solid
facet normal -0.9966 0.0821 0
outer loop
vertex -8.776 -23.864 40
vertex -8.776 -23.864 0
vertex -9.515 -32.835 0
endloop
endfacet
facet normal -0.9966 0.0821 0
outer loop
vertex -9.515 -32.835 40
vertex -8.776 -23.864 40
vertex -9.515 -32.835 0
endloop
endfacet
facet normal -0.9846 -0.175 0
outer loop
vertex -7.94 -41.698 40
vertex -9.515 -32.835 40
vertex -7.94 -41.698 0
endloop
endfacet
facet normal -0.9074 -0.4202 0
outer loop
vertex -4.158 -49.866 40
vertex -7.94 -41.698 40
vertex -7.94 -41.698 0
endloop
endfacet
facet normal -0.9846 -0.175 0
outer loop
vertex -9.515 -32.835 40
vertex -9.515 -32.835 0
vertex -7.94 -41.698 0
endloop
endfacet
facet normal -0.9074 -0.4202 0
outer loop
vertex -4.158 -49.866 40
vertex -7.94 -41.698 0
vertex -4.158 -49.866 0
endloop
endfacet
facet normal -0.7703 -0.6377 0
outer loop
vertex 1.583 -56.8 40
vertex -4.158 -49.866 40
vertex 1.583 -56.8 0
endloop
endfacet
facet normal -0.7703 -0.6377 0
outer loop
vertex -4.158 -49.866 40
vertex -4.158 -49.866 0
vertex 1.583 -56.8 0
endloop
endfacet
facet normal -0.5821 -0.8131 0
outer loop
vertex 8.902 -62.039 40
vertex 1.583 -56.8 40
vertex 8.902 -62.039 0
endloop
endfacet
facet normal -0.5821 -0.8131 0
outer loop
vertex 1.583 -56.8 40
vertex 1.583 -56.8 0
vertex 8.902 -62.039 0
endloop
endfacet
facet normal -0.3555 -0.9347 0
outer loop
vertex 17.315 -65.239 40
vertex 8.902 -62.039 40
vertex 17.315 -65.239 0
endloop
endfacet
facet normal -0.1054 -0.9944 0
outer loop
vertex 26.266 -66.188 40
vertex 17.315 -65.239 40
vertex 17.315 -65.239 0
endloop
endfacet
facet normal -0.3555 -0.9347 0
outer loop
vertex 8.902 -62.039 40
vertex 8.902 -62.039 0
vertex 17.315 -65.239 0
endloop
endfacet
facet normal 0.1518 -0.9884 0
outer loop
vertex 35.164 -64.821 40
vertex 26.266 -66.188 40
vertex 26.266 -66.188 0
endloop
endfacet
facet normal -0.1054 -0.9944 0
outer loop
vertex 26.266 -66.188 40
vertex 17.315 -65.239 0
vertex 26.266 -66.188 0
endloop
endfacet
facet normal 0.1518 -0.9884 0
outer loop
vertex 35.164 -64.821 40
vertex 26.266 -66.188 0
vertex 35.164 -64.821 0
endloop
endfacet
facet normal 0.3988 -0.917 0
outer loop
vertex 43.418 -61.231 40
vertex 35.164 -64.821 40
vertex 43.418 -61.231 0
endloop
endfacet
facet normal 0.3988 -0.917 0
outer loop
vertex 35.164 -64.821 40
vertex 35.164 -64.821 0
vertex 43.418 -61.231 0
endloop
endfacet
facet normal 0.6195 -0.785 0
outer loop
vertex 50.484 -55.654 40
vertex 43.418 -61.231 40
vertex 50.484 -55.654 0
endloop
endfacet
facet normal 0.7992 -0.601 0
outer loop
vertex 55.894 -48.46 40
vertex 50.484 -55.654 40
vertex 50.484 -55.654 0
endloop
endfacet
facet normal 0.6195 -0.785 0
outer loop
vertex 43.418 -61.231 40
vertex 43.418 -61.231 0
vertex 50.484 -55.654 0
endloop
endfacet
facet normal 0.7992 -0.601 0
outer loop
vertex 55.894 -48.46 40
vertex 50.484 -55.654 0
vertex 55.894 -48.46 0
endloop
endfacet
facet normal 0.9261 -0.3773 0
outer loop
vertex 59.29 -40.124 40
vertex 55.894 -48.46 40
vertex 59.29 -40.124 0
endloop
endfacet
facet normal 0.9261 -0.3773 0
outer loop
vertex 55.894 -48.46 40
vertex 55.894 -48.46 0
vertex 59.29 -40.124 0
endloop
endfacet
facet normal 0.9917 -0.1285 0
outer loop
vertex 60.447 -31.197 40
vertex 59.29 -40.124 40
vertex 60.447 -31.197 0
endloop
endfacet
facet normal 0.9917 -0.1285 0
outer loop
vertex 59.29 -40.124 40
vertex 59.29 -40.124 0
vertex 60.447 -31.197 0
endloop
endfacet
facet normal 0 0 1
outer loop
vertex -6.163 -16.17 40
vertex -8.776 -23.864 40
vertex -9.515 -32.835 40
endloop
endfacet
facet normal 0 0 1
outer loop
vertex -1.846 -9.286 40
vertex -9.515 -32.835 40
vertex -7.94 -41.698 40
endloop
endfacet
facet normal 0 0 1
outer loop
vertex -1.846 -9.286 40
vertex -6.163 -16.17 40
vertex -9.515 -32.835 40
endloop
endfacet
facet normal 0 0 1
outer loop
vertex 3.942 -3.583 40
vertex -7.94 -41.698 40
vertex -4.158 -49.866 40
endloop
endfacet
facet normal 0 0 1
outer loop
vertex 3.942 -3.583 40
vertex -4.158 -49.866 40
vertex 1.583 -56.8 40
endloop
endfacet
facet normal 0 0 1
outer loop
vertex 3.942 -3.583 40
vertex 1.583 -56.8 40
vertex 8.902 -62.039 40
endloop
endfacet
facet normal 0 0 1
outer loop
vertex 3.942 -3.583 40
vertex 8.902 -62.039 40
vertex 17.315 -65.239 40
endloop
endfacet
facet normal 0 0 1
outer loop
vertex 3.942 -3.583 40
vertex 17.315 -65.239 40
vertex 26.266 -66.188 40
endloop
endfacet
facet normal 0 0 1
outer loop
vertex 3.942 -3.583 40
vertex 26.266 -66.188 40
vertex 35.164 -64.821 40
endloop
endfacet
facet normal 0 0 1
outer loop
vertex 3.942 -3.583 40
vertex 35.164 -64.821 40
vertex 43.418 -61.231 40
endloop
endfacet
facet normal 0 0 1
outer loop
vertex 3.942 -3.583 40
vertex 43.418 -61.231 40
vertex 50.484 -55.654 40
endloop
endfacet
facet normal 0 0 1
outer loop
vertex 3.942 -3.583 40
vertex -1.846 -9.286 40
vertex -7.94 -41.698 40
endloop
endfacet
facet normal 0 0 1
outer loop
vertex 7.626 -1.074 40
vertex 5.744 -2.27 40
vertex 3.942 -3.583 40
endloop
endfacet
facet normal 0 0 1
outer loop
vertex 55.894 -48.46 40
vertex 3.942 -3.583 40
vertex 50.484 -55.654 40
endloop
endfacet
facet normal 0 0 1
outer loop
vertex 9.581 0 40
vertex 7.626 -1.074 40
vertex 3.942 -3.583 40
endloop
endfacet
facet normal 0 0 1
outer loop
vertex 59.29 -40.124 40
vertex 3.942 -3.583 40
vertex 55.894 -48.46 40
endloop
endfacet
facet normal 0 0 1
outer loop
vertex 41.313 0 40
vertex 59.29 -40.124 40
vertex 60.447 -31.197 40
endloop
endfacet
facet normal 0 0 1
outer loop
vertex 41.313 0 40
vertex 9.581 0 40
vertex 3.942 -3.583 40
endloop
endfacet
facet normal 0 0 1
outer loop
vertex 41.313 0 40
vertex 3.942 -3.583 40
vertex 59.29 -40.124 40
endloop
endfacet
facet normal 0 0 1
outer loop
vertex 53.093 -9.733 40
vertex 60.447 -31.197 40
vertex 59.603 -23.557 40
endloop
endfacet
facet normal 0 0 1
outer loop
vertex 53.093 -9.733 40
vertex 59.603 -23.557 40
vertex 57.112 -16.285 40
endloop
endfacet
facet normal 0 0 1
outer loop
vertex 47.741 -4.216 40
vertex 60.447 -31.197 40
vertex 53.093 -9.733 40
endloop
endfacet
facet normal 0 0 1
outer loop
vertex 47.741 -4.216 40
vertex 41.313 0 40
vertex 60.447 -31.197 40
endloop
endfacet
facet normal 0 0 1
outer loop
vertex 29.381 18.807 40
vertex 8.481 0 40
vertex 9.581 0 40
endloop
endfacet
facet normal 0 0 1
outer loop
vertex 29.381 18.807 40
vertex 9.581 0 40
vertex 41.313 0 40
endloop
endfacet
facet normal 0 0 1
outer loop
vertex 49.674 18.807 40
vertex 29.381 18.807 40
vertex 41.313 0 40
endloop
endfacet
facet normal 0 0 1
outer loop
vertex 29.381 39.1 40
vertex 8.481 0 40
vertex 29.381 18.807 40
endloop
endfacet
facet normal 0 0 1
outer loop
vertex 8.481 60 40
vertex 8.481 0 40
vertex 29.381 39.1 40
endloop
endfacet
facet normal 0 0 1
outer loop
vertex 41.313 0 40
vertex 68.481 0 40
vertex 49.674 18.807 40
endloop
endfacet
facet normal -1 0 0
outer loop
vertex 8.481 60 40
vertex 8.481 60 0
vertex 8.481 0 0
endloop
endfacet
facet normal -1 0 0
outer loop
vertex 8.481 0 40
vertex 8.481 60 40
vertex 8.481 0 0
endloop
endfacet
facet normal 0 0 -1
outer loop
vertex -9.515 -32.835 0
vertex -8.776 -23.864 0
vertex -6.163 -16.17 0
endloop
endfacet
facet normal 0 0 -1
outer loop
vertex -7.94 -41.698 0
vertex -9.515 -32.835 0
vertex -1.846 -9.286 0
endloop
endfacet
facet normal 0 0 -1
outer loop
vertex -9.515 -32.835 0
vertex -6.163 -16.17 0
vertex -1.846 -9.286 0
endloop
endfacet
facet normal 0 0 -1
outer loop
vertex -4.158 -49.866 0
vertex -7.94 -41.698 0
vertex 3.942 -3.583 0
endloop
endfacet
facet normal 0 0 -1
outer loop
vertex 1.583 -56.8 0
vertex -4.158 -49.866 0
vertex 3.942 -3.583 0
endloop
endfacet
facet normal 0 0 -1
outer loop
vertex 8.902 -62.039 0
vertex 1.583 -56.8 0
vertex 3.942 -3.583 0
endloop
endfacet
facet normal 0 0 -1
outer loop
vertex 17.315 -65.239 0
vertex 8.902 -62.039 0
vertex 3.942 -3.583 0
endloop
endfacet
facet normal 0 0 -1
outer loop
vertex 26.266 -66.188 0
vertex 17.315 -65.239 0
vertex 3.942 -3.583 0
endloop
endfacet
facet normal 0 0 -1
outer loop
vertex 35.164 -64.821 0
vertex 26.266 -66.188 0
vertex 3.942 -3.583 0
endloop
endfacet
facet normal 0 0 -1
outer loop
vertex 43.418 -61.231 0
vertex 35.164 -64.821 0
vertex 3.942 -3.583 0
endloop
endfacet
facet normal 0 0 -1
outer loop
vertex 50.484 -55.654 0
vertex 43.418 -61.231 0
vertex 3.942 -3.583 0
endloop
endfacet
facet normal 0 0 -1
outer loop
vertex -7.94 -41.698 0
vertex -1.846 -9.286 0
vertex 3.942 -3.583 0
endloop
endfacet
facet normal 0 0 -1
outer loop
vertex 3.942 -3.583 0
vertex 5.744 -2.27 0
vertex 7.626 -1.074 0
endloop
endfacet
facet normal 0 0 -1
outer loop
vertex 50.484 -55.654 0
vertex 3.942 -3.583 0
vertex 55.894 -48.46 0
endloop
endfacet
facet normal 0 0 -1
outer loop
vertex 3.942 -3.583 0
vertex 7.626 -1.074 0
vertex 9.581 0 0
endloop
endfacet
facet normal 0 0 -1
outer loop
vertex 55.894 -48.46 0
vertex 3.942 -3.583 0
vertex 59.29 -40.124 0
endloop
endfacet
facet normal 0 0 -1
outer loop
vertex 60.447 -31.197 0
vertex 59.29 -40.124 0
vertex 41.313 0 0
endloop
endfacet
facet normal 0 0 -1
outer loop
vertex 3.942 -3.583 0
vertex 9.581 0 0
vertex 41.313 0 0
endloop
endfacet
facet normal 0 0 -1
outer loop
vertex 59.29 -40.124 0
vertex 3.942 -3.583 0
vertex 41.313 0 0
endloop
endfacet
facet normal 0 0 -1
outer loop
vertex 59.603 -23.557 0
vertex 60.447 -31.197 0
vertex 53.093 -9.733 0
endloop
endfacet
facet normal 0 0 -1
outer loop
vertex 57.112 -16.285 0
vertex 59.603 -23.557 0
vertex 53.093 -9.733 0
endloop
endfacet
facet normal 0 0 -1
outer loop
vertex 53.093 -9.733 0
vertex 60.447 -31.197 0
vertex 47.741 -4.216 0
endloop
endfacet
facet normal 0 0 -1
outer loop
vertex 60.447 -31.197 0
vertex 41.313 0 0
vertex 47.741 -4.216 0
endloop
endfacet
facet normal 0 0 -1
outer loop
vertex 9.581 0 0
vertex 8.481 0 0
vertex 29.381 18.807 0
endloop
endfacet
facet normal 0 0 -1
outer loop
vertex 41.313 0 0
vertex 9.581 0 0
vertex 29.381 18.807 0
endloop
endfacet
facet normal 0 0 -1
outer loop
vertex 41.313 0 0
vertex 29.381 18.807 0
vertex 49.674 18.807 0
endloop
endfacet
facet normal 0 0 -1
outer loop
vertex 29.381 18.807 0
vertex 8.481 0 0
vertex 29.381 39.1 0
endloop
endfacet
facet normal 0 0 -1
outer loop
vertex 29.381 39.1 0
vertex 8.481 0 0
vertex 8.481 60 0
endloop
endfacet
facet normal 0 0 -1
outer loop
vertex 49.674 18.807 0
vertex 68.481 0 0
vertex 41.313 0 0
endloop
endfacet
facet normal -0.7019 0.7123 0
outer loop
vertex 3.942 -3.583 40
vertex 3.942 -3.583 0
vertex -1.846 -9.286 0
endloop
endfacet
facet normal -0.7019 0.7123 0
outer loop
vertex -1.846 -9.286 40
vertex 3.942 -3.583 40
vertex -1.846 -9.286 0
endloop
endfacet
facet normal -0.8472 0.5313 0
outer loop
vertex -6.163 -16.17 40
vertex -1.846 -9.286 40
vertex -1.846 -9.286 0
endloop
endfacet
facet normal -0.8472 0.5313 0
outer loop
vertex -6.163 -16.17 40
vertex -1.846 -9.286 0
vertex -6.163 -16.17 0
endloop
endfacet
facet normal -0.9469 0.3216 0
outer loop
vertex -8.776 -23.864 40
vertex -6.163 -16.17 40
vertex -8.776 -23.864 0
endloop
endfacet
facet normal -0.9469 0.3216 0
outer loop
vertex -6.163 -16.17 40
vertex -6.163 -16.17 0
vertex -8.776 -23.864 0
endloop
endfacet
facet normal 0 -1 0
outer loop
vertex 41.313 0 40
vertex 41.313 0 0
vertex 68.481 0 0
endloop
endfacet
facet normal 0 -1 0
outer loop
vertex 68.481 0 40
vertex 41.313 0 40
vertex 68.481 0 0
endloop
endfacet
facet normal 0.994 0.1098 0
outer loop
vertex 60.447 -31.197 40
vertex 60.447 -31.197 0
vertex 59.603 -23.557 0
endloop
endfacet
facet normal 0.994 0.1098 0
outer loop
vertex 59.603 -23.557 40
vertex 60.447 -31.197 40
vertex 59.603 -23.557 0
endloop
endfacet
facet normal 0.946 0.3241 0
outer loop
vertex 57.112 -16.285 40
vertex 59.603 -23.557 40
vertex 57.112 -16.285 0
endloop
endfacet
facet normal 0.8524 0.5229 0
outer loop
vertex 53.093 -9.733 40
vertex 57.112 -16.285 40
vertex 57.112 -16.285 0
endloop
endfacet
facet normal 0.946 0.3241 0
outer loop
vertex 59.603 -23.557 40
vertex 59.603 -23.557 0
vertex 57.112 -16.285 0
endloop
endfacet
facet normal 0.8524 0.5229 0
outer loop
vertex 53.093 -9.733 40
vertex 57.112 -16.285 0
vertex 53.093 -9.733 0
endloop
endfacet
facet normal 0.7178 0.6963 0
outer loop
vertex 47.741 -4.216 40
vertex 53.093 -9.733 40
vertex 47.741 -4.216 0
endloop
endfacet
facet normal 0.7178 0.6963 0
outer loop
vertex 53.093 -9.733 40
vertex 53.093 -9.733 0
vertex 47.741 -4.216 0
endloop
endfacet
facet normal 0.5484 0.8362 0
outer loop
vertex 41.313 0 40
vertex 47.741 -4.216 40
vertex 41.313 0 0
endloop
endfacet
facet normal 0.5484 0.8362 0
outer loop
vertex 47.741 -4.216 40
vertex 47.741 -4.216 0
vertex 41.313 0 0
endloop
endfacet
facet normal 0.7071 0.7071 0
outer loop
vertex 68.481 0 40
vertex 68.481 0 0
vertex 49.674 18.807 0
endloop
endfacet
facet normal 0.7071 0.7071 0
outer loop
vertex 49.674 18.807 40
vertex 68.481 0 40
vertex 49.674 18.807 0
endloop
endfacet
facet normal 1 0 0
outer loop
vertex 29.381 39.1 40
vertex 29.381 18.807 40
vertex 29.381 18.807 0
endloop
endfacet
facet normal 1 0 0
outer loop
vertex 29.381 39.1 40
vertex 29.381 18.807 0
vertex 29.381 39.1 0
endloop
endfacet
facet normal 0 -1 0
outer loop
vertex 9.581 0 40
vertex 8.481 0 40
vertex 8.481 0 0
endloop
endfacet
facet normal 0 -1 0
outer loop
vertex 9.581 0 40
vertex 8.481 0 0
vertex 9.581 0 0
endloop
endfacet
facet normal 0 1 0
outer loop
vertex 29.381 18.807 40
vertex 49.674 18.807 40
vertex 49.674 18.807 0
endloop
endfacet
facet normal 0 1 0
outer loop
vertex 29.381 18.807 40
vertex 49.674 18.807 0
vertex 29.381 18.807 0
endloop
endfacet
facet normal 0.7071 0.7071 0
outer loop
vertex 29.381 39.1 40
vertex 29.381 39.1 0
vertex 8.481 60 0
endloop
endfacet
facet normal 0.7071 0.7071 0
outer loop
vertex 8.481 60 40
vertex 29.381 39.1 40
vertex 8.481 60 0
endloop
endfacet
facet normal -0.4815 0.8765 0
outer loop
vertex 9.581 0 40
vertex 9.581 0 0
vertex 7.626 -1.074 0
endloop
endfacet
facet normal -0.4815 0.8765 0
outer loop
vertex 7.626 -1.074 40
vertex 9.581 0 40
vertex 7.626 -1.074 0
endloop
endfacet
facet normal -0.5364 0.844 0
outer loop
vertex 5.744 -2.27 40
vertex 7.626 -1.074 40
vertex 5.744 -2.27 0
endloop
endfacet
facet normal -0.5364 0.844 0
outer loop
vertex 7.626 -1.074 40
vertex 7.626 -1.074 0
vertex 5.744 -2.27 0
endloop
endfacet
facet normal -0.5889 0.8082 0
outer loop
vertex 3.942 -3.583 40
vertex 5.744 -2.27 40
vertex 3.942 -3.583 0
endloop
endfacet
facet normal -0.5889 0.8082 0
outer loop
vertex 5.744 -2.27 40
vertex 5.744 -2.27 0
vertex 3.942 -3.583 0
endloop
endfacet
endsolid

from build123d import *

# Parameters (mm, degrees)
F1_DEPTH = 40


with BuildPart() as f1:
    # F0 (on Top) → F1 (new body)
    with BuildSketch(Plane.XY):
        with BuildLine():
            ThreePointArc((3.942309171, -3.5829284162), (-4.2047941466, -12.6023770601), (-8.7761012616, -23.8642107282))
            Line((-8.7761012616, -23.8642107282), (3.942309171, -23.8642107282))
            Line((3.942309171, -23.8642107282), (3.942309171, -3.5829284162))
        make_face()
        with BuildLine():
            Line((3.942309171, -23.8642107282), (-8.7761012616, -23.8642107282))
            ThreePointArc((-8.7761012616, -23.8642107282), (21.7601480197, -66.0023779885), (60.4471145943, -31.1971157789))
            ThreePointArc((60.4471145943, -31.1971157789), (55.2826725913, -12.8984961859), (41.3134300795, 0))
            Line((41.3134300795, 0), (9.5807991091, 0))
            ThreePointArc((9.5807991091, 0), (6.6758729332, -1.6566268442), (3.942309171, -3.5829284162))
            Line((3.942309171, -3.5829284162), (3.942309171, -23.8642107282))
        make_face()
        with BuildLine():
            ThreePointArc((41.3134300795, 0), (25.4471145943, 3.8028842211), (9.5807991091, 0))
            Line((9.5807991091, 0), (41.3134300795, 0))
        make_face()
        with BuildLine():
            Line((8.4807705134, 0), (9.5807991091, 0))
            ThreePointArc((9.5807991091, 0), (25.4471145943, 3.8028842211), (41.3134300795, 0))
            Line((41.3134300795, 0), (68.4807705134, 0))
            Line((68.4807705134, 0), (49.6739435196, 18.8068269938))
            Line((49.6739435196, 18.8068269938), (29.3806760758, 18.8068269938))
            Line((29.3806760758, 18.8068269938), (29.3806760758, 39.1000944376))
            Line((29.3806760758, 39.1000944376), (8.4807705134, 60))
            Line((8.4807705134, 60), (8.4807705134, 0))
        make_face()
    extrude(amount=F1_DEPTH)


solid = f1.part
